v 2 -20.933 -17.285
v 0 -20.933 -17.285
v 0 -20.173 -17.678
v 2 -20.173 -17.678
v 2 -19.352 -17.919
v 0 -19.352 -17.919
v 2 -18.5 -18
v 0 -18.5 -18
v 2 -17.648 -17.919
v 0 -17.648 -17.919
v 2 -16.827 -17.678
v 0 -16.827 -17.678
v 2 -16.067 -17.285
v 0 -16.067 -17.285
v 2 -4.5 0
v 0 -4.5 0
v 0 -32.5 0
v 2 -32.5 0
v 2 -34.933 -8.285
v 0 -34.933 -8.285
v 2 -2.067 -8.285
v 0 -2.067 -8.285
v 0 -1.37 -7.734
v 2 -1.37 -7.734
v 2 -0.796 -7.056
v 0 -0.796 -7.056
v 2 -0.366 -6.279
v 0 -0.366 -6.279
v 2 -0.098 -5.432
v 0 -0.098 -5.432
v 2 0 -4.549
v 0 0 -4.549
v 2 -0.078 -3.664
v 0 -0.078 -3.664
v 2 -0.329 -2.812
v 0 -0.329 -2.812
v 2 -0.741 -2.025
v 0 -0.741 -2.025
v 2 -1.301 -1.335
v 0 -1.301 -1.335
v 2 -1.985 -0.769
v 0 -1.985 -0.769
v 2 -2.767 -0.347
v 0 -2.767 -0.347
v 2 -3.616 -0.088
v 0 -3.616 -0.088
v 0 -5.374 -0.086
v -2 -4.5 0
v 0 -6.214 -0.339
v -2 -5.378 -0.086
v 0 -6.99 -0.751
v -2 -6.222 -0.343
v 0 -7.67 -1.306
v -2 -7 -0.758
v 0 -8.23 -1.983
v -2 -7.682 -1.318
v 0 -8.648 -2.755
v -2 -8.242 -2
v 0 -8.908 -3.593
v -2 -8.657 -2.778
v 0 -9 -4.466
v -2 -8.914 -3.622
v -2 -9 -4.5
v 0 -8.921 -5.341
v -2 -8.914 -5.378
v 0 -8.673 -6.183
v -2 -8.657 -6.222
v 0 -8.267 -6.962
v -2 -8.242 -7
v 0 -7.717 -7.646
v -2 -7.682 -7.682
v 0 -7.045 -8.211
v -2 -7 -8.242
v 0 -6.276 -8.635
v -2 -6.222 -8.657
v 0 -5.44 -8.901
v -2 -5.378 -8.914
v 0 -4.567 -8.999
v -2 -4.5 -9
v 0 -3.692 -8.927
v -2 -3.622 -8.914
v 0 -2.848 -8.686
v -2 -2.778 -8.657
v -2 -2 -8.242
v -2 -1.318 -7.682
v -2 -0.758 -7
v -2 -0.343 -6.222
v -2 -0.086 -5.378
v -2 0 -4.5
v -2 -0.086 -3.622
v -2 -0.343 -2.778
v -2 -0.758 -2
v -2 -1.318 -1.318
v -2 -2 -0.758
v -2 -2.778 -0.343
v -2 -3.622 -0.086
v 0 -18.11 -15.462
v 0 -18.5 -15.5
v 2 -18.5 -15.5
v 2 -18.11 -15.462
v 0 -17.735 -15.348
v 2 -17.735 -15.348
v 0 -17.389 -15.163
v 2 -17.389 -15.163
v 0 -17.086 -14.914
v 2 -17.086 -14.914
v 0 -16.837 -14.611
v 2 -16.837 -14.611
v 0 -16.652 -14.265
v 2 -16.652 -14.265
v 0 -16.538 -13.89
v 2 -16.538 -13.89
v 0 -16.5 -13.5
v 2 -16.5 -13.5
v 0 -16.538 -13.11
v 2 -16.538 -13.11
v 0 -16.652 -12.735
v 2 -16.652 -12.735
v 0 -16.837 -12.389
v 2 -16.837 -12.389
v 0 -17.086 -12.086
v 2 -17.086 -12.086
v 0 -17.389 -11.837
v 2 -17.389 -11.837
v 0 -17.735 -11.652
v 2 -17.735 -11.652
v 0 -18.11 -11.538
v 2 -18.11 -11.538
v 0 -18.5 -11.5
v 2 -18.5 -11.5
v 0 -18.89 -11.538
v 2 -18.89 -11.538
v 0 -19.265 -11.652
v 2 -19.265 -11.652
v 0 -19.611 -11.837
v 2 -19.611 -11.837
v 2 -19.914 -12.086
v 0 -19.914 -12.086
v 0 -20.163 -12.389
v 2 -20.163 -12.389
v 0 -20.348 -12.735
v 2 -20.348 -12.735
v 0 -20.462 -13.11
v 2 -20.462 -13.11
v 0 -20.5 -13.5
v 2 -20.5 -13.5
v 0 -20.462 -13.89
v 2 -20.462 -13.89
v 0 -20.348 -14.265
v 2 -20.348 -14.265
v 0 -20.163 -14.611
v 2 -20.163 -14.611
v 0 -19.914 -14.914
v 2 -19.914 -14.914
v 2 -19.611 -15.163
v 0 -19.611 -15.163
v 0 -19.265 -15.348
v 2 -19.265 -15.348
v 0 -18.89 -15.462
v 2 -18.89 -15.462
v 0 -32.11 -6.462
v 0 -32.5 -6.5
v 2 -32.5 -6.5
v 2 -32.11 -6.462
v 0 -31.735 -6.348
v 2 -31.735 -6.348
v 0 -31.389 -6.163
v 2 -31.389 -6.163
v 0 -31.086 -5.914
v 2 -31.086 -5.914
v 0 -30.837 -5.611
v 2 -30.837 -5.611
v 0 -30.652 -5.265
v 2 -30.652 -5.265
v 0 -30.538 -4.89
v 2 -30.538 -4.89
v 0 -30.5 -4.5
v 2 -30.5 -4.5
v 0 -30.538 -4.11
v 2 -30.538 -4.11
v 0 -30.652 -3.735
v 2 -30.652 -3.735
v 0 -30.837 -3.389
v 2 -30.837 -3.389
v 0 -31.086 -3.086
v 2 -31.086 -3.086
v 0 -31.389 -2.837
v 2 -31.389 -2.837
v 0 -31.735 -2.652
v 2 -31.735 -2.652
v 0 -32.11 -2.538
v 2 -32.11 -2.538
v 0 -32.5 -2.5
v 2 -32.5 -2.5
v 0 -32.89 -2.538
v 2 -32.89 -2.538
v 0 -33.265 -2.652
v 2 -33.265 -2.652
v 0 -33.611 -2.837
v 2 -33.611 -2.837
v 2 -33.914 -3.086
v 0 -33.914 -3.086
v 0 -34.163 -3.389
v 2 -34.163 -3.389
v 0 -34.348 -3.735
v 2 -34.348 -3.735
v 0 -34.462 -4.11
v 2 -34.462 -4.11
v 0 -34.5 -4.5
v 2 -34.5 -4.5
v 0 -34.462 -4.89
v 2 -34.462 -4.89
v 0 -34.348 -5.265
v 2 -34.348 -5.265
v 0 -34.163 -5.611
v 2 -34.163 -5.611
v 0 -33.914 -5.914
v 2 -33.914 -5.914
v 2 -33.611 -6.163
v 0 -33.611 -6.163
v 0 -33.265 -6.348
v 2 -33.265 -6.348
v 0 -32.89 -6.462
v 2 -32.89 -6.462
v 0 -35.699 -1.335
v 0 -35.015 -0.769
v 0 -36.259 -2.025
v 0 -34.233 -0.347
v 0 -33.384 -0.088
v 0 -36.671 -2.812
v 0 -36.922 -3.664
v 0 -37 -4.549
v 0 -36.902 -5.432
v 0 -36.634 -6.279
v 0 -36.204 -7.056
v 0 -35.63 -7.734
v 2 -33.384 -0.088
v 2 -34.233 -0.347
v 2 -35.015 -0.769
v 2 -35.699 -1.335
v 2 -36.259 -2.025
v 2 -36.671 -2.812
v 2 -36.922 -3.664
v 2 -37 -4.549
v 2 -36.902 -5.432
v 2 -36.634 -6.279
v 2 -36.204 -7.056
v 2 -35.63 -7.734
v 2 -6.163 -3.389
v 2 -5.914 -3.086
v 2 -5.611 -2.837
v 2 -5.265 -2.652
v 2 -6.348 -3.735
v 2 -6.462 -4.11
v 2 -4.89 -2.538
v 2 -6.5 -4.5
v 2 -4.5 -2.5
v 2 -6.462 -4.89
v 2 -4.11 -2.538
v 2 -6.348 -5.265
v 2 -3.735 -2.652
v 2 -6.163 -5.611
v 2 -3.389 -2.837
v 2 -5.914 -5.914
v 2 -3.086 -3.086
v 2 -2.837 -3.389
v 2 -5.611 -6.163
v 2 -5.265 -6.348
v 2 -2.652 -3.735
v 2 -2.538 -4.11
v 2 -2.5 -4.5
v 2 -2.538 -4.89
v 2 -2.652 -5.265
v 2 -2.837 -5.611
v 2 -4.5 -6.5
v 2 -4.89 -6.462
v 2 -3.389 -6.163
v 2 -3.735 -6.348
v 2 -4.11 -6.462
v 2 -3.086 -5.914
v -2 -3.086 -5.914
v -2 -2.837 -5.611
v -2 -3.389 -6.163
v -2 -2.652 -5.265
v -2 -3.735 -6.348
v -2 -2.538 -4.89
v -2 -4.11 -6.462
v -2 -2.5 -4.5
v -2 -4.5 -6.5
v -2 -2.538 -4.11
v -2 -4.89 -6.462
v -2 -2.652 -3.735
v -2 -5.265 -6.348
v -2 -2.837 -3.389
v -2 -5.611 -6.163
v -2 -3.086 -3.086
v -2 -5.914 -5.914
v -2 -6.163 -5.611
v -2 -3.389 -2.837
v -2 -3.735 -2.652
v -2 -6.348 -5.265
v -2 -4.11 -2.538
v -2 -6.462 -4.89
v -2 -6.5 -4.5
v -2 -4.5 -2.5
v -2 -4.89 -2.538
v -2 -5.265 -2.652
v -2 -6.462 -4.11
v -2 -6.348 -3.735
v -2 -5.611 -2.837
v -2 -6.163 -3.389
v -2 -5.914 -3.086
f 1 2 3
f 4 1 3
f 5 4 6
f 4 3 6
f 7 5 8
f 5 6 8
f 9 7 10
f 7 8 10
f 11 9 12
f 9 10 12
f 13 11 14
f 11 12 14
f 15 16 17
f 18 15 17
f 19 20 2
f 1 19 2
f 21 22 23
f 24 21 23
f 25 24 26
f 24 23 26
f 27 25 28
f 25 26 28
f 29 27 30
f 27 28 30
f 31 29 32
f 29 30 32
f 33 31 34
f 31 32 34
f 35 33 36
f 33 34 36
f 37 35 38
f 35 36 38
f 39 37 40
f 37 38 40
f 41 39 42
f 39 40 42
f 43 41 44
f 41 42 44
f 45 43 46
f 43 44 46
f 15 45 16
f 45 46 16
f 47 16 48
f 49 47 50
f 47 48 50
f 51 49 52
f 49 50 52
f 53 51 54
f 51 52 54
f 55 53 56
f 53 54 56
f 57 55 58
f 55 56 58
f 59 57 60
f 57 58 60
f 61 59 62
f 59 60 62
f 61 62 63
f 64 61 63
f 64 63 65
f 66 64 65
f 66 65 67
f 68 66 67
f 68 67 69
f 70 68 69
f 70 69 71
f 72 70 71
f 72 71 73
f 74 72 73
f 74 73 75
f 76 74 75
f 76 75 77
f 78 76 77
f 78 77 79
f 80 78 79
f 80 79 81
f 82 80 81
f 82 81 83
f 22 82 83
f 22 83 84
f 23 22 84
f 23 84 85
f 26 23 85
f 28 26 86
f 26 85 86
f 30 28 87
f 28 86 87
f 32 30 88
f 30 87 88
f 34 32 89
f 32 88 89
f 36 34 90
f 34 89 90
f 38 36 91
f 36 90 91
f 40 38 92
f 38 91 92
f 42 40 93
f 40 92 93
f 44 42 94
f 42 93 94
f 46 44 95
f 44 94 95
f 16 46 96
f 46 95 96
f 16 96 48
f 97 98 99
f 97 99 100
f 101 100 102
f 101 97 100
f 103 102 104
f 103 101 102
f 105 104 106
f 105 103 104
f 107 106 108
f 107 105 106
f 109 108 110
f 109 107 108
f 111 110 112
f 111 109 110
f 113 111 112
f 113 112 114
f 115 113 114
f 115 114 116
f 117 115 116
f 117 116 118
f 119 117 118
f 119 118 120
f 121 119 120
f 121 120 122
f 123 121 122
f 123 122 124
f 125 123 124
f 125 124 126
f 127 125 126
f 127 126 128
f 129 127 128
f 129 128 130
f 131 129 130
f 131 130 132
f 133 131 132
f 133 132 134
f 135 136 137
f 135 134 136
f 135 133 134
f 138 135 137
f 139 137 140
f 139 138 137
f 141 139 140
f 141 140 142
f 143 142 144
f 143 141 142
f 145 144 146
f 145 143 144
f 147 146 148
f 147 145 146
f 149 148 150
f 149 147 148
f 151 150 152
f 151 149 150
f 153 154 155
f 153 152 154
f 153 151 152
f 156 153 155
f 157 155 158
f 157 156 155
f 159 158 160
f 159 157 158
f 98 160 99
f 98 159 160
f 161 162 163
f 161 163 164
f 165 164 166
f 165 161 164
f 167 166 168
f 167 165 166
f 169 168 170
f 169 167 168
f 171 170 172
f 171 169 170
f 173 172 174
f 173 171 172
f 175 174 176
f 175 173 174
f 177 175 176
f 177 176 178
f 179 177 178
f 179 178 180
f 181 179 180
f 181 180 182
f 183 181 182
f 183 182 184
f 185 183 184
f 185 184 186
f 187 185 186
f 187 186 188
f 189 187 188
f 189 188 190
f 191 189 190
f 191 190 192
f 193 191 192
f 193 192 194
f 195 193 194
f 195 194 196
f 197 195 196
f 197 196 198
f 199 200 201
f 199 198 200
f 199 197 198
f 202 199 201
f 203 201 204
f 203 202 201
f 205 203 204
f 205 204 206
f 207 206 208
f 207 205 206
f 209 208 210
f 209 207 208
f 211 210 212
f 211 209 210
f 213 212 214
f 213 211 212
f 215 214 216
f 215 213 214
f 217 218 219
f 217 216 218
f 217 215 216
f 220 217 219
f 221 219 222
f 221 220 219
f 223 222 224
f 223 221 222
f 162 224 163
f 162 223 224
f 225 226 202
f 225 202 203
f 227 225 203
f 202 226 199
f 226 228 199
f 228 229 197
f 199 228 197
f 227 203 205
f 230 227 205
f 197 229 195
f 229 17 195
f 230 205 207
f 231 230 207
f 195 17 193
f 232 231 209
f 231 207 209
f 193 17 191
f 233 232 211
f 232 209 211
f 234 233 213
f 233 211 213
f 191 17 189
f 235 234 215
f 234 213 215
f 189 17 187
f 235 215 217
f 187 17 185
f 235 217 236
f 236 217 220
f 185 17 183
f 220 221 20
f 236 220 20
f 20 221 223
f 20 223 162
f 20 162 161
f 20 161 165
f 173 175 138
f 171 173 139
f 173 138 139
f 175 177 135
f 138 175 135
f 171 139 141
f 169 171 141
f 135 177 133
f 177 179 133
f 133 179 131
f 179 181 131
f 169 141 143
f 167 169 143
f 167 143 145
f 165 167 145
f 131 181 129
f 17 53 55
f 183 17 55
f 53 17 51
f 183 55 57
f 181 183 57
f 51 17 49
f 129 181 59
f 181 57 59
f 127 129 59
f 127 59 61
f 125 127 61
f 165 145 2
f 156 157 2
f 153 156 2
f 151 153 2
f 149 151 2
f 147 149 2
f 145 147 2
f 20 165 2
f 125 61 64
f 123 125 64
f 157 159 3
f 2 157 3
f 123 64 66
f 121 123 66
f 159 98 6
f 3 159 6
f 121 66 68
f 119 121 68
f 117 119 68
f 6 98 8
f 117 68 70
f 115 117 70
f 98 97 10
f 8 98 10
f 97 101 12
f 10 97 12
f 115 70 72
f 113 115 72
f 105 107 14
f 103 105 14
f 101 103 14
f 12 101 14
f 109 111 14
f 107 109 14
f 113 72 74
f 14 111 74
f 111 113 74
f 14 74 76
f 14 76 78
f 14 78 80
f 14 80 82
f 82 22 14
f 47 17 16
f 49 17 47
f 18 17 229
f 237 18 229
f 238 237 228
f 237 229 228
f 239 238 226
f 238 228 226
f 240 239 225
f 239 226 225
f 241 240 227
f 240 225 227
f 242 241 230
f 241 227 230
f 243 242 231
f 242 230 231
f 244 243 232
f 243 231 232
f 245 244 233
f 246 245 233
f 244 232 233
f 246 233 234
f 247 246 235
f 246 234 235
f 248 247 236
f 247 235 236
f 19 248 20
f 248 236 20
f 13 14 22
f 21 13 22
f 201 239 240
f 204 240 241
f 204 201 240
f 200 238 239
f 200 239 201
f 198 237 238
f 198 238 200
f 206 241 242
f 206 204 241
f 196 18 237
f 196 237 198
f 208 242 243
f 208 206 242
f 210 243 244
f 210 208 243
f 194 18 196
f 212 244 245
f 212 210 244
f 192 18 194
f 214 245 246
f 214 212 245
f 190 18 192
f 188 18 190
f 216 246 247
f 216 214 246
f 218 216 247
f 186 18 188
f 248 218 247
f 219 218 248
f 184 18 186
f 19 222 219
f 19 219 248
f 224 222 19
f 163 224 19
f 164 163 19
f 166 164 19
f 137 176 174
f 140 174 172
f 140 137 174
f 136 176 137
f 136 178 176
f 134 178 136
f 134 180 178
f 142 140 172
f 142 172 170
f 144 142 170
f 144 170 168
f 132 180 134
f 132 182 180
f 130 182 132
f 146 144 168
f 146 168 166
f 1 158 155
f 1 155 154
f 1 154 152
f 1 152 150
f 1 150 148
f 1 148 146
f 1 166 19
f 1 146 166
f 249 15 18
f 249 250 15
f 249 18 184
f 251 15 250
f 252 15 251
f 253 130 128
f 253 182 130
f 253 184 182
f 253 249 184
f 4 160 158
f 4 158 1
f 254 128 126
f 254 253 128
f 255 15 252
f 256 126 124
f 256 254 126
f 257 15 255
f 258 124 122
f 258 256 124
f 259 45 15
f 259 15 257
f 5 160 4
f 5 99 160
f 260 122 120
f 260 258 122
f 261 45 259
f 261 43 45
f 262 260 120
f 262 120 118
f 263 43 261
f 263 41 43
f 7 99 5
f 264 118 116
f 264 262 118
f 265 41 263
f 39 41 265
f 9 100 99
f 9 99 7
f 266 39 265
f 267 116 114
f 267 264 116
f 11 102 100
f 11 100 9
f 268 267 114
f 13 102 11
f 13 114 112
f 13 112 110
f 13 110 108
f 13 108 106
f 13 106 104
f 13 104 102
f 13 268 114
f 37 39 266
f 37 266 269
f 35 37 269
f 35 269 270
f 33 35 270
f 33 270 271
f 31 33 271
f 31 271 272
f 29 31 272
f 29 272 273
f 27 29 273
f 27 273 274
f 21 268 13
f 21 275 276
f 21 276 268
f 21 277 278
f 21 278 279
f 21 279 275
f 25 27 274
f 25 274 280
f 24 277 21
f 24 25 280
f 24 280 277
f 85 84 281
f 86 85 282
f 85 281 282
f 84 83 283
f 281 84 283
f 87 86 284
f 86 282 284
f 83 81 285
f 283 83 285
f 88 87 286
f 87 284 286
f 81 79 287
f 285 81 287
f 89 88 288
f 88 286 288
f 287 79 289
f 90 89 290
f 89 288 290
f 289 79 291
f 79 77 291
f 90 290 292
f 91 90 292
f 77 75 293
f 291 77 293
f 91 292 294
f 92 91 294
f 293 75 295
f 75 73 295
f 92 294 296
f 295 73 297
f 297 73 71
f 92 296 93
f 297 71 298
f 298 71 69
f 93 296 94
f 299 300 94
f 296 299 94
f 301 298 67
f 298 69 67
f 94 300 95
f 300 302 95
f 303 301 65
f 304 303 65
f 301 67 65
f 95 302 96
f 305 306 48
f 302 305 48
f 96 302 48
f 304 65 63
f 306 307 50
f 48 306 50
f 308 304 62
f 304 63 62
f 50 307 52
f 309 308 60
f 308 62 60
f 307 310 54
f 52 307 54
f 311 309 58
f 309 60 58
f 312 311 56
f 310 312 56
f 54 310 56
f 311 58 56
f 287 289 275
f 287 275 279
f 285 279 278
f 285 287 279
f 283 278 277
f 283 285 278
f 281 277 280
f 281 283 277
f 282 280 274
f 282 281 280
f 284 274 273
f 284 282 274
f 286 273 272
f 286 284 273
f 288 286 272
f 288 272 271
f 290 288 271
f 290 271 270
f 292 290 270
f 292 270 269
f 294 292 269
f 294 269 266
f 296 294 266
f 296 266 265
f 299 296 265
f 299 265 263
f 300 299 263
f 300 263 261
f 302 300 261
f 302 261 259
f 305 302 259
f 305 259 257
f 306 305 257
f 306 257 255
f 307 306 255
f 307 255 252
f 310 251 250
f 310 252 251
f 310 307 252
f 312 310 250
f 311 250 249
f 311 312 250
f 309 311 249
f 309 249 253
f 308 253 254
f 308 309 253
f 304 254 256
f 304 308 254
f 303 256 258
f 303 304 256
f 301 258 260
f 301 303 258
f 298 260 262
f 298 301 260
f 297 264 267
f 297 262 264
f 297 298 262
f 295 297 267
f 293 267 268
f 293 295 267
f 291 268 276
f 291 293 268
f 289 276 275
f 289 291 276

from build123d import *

# Parameters (mm, degrees)
EXTRUDE_1_DEPTH          = 2
EXTRUDE_START            = -2
SKETCH_1_4_R             = 4.5
EXTRUDE_2_DEPTH          = 2
CUT_EXTRUDE_1_DEPTH      = 42.194659848
CUT_EXTRUDE_1_DEPTH_BACK = 42.194659848
SKETCH_1_3_R             = 2


with BuildPart() as part:
    # 草图1 → 凸台-拉伸1 (new body)
    with BuildSketch(Plane(origin=(0, 0, 0), x_dir=(0, 0, -1), z_dir=(1, 0, 0))):
        with BuildLine():
            Line((17.285303139, -16.066590839), (8.285303139, -2.066590839))
            ThreePointArc((8.285303139, -2.066590839), (3.231903814, -0.182369624), (0, -4.5))
            Line((0, -4.5), (0, -32.499999989))
            ThreePointArc((0, -32.499999989), (3.231903809, -36.817630374), (8.285303139, -34.933409161))
            Line((8.285303139, -34.933409161), (17.285303139, -20.933409161))
            ThreePointArc((17.285303139, -20.933409161), (18, -18.5), (17.285303139, -16.066590839))
        make_face()
    extrude(amount=EXTRUDE_1_DEPTH)

    # 草图1<4> → 凸台-拉伸2 (add)
    with BuildSketch(Plane(origin=(0, 0, 0), x_dir=(0, 0, -1), z_dir=(1, 0, 0)).offset(EXTRUDE_START)):
        with Locations((4.5, -4.5)):
            Circle(SKETCH_1_4_R)
    extrude(amount=EXTRUDE_2_DEPTH)

    # 草图1<3> → 切除-拉伸1 (cut, two sides: drawn at the far end of the back side and taken through both)
    with BuildSketch(Plane(origin=(0, 0, 0), x_dir=(0, 0, -1), z_dir=(1, 0, 0)).offset(-CUT_EXTRUDE_1_DEPTH_BACK)):
        with Locations((4.5, -4.5)):
            Circle(SKETCH_1_3_R)
        with Locations((13.5, -18.5)):
            Circle(SKETCH_1_3_R)
        with Locations((4.5, -32.5)):
            Circle(SKETCH_1_3_R)
    extrude(amount=CUT_EXTRUDE_1_DEPTH + CUT_EXTRUDE_1_DEPTH_BACK, mode=Mode.SUBTRACT)


solid = part.part
